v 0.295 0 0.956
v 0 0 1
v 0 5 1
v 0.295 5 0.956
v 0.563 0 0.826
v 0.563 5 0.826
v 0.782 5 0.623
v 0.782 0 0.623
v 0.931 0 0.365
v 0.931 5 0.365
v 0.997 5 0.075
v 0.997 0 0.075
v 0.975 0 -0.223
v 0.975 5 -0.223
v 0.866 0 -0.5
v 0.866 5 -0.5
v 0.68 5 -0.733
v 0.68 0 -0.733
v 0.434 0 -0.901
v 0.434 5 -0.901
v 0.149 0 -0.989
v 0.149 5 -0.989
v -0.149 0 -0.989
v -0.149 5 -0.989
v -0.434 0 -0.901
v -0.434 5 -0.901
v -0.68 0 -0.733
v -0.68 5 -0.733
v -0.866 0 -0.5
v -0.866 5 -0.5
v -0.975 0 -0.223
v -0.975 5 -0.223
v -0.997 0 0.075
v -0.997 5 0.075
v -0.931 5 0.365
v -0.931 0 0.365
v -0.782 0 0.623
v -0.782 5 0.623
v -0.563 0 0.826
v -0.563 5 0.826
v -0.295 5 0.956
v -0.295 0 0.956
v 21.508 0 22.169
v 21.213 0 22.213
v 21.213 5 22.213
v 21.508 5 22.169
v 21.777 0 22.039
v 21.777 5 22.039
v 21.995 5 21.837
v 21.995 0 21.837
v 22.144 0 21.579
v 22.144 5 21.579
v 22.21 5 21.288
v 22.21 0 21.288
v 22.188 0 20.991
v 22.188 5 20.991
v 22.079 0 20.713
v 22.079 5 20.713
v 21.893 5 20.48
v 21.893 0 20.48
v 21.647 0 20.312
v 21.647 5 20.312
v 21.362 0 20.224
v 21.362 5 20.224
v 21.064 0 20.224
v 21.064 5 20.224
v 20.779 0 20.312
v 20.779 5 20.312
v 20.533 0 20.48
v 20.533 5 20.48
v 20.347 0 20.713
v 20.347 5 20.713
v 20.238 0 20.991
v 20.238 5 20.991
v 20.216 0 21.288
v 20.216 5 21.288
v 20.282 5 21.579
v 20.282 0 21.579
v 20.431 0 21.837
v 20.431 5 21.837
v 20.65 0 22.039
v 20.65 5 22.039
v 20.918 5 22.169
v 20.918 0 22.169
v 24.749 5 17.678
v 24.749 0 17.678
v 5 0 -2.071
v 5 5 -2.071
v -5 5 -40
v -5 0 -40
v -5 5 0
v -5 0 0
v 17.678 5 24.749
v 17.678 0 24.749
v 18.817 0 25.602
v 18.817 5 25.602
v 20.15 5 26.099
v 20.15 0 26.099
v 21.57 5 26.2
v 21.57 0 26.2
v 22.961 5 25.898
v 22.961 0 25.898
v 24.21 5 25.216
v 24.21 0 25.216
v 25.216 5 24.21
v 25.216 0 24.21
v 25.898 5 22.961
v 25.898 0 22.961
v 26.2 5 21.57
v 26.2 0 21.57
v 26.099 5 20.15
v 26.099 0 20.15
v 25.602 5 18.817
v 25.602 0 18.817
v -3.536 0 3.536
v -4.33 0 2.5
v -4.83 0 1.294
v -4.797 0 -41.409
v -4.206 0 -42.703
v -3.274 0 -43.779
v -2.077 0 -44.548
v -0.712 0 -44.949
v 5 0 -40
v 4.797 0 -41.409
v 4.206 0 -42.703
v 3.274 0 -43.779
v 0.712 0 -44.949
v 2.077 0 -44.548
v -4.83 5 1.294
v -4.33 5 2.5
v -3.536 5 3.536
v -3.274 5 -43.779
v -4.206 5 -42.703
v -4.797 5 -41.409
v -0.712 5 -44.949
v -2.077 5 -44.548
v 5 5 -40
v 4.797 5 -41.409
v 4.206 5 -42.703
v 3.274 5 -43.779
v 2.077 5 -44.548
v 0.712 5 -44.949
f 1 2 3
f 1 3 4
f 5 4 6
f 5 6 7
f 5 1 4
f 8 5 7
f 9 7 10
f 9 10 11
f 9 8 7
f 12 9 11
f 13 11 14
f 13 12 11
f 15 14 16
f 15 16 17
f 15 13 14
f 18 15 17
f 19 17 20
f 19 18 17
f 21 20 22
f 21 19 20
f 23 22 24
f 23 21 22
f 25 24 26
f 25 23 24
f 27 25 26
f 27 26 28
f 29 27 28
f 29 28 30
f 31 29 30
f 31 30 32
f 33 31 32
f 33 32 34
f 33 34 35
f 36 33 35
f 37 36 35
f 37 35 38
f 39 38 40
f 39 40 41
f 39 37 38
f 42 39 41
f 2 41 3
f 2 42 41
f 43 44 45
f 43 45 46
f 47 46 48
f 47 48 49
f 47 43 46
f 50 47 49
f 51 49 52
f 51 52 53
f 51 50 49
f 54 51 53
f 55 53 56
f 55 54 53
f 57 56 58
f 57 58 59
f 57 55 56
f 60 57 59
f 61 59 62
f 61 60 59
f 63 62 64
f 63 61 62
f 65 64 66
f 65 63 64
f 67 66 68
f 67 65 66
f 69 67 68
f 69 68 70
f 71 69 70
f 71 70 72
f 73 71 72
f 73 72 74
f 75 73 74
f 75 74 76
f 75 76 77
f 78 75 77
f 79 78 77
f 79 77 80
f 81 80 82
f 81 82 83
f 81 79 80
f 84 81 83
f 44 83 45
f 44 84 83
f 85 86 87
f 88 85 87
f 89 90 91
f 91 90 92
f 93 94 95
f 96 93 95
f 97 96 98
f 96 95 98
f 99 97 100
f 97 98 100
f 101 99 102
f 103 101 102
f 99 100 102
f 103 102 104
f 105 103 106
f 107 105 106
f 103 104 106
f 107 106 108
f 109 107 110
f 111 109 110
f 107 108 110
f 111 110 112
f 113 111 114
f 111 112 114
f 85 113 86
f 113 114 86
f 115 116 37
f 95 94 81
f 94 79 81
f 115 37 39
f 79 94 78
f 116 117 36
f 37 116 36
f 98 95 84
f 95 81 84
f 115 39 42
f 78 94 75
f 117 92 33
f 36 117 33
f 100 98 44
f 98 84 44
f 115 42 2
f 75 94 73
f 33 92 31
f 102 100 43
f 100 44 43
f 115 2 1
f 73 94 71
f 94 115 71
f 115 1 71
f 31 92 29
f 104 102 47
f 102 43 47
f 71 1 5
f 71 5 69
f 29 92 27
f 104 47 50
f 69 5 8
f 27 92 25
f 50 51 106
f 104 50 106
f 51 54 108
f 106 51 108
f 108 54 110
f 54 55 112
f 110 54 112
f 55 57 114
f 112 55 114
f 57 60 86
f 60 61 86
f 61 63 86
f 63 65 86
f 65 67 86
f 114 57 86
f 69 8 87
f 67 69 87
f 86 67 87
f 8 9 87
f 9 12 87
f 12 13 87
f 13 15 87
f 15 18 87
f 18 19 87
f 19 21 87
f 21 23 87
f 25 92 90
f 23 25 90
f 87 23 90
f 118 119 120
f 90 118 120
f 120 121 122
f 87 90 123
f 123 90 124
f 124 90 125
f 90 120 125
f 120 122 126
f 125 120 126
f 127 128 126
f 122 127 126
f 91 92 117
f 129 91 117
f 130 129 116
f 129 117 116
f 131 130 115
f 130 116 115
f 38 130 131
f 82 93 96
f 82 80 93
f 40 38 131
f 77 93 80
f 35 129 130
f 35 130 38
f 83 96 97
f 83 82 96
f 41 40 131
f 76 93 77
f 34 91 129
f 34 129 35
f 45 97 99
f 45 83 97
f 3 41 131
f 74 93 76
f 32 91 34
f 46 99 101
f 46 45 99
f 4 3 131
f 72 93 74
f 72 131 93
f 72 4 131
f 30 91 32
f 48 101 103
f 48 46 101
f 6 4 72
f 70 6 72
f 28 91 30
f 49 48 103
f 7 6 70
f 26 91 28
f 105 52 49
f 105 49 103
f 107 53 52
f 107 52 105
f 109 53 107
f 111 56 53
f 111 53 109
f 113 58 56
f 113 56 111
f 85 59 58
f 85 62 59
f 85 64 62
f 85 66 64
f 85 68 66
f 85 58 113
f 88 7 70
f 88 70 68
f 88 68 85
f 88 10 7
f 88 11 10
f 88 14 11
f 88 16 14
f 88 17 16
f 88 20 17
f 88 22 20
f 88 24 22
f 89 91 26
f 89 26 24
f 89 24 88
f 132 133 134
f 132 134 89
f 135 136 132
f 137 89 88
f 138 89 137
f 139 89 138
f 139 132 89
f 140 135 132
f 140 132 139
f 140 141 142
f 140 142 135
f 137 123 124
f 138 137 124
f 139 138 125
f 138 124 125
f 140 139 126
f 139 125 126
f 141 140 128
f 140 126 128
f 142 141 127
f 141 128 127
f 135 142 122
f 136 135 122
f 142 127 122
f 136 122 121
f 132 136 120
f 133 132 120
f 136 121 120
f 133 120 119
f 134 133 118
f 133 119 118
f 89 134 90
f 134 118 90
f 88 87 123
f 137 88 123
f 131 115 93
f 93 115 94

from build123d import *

# Parameters (mm, degrees)
SKETCH3_R           = 1
BOSS_EXTRUDE2_DEPTH = 5


with BuildPart() as part:
    # Sketch3 → Boss-Extrude2 (new body)
    with BuildSketch(Plane(origin=(0, 0, 0), x_dir=(1, 0, 0), z_dir=(0, 1, 0))):
        with BuildLine():
            Line((-5, 40), (-5, 0))
            ThreePointArc((-5, 0), (-4.619397663, -1.913417162), (-3.535533906, -3.535533906))
            Line((-3.535533906, -3.535533906), (17.67766953, -24.748737342))
            ThreePointArc((17.67766953, -24.748737342), (24.748737342, -24.748737342), (24.748737342, -17.67766953))
            Line((24.748737342, -17.67766953), (5, 2.071067812))
            Line((5, 2.071067812), (5, 40))
            ThreePointArc((5, 40), (0, 45), (-5, 40))
        make_face()
        with Locations(Location((0, 0, 0), (0, 0, 270))):
            Circle(SKETCH3_R, mode=Mode.SUBTRACT)
        with Locations(Location((21.213203436, -21.213203436, 0), (0, 0, 270))):
            Circle(SKETCH3_R, mode=Mode.SUBTRACT)
    extrude(amount=BOSS_EXTRUDE2_DEPTH)


solid = part.part
